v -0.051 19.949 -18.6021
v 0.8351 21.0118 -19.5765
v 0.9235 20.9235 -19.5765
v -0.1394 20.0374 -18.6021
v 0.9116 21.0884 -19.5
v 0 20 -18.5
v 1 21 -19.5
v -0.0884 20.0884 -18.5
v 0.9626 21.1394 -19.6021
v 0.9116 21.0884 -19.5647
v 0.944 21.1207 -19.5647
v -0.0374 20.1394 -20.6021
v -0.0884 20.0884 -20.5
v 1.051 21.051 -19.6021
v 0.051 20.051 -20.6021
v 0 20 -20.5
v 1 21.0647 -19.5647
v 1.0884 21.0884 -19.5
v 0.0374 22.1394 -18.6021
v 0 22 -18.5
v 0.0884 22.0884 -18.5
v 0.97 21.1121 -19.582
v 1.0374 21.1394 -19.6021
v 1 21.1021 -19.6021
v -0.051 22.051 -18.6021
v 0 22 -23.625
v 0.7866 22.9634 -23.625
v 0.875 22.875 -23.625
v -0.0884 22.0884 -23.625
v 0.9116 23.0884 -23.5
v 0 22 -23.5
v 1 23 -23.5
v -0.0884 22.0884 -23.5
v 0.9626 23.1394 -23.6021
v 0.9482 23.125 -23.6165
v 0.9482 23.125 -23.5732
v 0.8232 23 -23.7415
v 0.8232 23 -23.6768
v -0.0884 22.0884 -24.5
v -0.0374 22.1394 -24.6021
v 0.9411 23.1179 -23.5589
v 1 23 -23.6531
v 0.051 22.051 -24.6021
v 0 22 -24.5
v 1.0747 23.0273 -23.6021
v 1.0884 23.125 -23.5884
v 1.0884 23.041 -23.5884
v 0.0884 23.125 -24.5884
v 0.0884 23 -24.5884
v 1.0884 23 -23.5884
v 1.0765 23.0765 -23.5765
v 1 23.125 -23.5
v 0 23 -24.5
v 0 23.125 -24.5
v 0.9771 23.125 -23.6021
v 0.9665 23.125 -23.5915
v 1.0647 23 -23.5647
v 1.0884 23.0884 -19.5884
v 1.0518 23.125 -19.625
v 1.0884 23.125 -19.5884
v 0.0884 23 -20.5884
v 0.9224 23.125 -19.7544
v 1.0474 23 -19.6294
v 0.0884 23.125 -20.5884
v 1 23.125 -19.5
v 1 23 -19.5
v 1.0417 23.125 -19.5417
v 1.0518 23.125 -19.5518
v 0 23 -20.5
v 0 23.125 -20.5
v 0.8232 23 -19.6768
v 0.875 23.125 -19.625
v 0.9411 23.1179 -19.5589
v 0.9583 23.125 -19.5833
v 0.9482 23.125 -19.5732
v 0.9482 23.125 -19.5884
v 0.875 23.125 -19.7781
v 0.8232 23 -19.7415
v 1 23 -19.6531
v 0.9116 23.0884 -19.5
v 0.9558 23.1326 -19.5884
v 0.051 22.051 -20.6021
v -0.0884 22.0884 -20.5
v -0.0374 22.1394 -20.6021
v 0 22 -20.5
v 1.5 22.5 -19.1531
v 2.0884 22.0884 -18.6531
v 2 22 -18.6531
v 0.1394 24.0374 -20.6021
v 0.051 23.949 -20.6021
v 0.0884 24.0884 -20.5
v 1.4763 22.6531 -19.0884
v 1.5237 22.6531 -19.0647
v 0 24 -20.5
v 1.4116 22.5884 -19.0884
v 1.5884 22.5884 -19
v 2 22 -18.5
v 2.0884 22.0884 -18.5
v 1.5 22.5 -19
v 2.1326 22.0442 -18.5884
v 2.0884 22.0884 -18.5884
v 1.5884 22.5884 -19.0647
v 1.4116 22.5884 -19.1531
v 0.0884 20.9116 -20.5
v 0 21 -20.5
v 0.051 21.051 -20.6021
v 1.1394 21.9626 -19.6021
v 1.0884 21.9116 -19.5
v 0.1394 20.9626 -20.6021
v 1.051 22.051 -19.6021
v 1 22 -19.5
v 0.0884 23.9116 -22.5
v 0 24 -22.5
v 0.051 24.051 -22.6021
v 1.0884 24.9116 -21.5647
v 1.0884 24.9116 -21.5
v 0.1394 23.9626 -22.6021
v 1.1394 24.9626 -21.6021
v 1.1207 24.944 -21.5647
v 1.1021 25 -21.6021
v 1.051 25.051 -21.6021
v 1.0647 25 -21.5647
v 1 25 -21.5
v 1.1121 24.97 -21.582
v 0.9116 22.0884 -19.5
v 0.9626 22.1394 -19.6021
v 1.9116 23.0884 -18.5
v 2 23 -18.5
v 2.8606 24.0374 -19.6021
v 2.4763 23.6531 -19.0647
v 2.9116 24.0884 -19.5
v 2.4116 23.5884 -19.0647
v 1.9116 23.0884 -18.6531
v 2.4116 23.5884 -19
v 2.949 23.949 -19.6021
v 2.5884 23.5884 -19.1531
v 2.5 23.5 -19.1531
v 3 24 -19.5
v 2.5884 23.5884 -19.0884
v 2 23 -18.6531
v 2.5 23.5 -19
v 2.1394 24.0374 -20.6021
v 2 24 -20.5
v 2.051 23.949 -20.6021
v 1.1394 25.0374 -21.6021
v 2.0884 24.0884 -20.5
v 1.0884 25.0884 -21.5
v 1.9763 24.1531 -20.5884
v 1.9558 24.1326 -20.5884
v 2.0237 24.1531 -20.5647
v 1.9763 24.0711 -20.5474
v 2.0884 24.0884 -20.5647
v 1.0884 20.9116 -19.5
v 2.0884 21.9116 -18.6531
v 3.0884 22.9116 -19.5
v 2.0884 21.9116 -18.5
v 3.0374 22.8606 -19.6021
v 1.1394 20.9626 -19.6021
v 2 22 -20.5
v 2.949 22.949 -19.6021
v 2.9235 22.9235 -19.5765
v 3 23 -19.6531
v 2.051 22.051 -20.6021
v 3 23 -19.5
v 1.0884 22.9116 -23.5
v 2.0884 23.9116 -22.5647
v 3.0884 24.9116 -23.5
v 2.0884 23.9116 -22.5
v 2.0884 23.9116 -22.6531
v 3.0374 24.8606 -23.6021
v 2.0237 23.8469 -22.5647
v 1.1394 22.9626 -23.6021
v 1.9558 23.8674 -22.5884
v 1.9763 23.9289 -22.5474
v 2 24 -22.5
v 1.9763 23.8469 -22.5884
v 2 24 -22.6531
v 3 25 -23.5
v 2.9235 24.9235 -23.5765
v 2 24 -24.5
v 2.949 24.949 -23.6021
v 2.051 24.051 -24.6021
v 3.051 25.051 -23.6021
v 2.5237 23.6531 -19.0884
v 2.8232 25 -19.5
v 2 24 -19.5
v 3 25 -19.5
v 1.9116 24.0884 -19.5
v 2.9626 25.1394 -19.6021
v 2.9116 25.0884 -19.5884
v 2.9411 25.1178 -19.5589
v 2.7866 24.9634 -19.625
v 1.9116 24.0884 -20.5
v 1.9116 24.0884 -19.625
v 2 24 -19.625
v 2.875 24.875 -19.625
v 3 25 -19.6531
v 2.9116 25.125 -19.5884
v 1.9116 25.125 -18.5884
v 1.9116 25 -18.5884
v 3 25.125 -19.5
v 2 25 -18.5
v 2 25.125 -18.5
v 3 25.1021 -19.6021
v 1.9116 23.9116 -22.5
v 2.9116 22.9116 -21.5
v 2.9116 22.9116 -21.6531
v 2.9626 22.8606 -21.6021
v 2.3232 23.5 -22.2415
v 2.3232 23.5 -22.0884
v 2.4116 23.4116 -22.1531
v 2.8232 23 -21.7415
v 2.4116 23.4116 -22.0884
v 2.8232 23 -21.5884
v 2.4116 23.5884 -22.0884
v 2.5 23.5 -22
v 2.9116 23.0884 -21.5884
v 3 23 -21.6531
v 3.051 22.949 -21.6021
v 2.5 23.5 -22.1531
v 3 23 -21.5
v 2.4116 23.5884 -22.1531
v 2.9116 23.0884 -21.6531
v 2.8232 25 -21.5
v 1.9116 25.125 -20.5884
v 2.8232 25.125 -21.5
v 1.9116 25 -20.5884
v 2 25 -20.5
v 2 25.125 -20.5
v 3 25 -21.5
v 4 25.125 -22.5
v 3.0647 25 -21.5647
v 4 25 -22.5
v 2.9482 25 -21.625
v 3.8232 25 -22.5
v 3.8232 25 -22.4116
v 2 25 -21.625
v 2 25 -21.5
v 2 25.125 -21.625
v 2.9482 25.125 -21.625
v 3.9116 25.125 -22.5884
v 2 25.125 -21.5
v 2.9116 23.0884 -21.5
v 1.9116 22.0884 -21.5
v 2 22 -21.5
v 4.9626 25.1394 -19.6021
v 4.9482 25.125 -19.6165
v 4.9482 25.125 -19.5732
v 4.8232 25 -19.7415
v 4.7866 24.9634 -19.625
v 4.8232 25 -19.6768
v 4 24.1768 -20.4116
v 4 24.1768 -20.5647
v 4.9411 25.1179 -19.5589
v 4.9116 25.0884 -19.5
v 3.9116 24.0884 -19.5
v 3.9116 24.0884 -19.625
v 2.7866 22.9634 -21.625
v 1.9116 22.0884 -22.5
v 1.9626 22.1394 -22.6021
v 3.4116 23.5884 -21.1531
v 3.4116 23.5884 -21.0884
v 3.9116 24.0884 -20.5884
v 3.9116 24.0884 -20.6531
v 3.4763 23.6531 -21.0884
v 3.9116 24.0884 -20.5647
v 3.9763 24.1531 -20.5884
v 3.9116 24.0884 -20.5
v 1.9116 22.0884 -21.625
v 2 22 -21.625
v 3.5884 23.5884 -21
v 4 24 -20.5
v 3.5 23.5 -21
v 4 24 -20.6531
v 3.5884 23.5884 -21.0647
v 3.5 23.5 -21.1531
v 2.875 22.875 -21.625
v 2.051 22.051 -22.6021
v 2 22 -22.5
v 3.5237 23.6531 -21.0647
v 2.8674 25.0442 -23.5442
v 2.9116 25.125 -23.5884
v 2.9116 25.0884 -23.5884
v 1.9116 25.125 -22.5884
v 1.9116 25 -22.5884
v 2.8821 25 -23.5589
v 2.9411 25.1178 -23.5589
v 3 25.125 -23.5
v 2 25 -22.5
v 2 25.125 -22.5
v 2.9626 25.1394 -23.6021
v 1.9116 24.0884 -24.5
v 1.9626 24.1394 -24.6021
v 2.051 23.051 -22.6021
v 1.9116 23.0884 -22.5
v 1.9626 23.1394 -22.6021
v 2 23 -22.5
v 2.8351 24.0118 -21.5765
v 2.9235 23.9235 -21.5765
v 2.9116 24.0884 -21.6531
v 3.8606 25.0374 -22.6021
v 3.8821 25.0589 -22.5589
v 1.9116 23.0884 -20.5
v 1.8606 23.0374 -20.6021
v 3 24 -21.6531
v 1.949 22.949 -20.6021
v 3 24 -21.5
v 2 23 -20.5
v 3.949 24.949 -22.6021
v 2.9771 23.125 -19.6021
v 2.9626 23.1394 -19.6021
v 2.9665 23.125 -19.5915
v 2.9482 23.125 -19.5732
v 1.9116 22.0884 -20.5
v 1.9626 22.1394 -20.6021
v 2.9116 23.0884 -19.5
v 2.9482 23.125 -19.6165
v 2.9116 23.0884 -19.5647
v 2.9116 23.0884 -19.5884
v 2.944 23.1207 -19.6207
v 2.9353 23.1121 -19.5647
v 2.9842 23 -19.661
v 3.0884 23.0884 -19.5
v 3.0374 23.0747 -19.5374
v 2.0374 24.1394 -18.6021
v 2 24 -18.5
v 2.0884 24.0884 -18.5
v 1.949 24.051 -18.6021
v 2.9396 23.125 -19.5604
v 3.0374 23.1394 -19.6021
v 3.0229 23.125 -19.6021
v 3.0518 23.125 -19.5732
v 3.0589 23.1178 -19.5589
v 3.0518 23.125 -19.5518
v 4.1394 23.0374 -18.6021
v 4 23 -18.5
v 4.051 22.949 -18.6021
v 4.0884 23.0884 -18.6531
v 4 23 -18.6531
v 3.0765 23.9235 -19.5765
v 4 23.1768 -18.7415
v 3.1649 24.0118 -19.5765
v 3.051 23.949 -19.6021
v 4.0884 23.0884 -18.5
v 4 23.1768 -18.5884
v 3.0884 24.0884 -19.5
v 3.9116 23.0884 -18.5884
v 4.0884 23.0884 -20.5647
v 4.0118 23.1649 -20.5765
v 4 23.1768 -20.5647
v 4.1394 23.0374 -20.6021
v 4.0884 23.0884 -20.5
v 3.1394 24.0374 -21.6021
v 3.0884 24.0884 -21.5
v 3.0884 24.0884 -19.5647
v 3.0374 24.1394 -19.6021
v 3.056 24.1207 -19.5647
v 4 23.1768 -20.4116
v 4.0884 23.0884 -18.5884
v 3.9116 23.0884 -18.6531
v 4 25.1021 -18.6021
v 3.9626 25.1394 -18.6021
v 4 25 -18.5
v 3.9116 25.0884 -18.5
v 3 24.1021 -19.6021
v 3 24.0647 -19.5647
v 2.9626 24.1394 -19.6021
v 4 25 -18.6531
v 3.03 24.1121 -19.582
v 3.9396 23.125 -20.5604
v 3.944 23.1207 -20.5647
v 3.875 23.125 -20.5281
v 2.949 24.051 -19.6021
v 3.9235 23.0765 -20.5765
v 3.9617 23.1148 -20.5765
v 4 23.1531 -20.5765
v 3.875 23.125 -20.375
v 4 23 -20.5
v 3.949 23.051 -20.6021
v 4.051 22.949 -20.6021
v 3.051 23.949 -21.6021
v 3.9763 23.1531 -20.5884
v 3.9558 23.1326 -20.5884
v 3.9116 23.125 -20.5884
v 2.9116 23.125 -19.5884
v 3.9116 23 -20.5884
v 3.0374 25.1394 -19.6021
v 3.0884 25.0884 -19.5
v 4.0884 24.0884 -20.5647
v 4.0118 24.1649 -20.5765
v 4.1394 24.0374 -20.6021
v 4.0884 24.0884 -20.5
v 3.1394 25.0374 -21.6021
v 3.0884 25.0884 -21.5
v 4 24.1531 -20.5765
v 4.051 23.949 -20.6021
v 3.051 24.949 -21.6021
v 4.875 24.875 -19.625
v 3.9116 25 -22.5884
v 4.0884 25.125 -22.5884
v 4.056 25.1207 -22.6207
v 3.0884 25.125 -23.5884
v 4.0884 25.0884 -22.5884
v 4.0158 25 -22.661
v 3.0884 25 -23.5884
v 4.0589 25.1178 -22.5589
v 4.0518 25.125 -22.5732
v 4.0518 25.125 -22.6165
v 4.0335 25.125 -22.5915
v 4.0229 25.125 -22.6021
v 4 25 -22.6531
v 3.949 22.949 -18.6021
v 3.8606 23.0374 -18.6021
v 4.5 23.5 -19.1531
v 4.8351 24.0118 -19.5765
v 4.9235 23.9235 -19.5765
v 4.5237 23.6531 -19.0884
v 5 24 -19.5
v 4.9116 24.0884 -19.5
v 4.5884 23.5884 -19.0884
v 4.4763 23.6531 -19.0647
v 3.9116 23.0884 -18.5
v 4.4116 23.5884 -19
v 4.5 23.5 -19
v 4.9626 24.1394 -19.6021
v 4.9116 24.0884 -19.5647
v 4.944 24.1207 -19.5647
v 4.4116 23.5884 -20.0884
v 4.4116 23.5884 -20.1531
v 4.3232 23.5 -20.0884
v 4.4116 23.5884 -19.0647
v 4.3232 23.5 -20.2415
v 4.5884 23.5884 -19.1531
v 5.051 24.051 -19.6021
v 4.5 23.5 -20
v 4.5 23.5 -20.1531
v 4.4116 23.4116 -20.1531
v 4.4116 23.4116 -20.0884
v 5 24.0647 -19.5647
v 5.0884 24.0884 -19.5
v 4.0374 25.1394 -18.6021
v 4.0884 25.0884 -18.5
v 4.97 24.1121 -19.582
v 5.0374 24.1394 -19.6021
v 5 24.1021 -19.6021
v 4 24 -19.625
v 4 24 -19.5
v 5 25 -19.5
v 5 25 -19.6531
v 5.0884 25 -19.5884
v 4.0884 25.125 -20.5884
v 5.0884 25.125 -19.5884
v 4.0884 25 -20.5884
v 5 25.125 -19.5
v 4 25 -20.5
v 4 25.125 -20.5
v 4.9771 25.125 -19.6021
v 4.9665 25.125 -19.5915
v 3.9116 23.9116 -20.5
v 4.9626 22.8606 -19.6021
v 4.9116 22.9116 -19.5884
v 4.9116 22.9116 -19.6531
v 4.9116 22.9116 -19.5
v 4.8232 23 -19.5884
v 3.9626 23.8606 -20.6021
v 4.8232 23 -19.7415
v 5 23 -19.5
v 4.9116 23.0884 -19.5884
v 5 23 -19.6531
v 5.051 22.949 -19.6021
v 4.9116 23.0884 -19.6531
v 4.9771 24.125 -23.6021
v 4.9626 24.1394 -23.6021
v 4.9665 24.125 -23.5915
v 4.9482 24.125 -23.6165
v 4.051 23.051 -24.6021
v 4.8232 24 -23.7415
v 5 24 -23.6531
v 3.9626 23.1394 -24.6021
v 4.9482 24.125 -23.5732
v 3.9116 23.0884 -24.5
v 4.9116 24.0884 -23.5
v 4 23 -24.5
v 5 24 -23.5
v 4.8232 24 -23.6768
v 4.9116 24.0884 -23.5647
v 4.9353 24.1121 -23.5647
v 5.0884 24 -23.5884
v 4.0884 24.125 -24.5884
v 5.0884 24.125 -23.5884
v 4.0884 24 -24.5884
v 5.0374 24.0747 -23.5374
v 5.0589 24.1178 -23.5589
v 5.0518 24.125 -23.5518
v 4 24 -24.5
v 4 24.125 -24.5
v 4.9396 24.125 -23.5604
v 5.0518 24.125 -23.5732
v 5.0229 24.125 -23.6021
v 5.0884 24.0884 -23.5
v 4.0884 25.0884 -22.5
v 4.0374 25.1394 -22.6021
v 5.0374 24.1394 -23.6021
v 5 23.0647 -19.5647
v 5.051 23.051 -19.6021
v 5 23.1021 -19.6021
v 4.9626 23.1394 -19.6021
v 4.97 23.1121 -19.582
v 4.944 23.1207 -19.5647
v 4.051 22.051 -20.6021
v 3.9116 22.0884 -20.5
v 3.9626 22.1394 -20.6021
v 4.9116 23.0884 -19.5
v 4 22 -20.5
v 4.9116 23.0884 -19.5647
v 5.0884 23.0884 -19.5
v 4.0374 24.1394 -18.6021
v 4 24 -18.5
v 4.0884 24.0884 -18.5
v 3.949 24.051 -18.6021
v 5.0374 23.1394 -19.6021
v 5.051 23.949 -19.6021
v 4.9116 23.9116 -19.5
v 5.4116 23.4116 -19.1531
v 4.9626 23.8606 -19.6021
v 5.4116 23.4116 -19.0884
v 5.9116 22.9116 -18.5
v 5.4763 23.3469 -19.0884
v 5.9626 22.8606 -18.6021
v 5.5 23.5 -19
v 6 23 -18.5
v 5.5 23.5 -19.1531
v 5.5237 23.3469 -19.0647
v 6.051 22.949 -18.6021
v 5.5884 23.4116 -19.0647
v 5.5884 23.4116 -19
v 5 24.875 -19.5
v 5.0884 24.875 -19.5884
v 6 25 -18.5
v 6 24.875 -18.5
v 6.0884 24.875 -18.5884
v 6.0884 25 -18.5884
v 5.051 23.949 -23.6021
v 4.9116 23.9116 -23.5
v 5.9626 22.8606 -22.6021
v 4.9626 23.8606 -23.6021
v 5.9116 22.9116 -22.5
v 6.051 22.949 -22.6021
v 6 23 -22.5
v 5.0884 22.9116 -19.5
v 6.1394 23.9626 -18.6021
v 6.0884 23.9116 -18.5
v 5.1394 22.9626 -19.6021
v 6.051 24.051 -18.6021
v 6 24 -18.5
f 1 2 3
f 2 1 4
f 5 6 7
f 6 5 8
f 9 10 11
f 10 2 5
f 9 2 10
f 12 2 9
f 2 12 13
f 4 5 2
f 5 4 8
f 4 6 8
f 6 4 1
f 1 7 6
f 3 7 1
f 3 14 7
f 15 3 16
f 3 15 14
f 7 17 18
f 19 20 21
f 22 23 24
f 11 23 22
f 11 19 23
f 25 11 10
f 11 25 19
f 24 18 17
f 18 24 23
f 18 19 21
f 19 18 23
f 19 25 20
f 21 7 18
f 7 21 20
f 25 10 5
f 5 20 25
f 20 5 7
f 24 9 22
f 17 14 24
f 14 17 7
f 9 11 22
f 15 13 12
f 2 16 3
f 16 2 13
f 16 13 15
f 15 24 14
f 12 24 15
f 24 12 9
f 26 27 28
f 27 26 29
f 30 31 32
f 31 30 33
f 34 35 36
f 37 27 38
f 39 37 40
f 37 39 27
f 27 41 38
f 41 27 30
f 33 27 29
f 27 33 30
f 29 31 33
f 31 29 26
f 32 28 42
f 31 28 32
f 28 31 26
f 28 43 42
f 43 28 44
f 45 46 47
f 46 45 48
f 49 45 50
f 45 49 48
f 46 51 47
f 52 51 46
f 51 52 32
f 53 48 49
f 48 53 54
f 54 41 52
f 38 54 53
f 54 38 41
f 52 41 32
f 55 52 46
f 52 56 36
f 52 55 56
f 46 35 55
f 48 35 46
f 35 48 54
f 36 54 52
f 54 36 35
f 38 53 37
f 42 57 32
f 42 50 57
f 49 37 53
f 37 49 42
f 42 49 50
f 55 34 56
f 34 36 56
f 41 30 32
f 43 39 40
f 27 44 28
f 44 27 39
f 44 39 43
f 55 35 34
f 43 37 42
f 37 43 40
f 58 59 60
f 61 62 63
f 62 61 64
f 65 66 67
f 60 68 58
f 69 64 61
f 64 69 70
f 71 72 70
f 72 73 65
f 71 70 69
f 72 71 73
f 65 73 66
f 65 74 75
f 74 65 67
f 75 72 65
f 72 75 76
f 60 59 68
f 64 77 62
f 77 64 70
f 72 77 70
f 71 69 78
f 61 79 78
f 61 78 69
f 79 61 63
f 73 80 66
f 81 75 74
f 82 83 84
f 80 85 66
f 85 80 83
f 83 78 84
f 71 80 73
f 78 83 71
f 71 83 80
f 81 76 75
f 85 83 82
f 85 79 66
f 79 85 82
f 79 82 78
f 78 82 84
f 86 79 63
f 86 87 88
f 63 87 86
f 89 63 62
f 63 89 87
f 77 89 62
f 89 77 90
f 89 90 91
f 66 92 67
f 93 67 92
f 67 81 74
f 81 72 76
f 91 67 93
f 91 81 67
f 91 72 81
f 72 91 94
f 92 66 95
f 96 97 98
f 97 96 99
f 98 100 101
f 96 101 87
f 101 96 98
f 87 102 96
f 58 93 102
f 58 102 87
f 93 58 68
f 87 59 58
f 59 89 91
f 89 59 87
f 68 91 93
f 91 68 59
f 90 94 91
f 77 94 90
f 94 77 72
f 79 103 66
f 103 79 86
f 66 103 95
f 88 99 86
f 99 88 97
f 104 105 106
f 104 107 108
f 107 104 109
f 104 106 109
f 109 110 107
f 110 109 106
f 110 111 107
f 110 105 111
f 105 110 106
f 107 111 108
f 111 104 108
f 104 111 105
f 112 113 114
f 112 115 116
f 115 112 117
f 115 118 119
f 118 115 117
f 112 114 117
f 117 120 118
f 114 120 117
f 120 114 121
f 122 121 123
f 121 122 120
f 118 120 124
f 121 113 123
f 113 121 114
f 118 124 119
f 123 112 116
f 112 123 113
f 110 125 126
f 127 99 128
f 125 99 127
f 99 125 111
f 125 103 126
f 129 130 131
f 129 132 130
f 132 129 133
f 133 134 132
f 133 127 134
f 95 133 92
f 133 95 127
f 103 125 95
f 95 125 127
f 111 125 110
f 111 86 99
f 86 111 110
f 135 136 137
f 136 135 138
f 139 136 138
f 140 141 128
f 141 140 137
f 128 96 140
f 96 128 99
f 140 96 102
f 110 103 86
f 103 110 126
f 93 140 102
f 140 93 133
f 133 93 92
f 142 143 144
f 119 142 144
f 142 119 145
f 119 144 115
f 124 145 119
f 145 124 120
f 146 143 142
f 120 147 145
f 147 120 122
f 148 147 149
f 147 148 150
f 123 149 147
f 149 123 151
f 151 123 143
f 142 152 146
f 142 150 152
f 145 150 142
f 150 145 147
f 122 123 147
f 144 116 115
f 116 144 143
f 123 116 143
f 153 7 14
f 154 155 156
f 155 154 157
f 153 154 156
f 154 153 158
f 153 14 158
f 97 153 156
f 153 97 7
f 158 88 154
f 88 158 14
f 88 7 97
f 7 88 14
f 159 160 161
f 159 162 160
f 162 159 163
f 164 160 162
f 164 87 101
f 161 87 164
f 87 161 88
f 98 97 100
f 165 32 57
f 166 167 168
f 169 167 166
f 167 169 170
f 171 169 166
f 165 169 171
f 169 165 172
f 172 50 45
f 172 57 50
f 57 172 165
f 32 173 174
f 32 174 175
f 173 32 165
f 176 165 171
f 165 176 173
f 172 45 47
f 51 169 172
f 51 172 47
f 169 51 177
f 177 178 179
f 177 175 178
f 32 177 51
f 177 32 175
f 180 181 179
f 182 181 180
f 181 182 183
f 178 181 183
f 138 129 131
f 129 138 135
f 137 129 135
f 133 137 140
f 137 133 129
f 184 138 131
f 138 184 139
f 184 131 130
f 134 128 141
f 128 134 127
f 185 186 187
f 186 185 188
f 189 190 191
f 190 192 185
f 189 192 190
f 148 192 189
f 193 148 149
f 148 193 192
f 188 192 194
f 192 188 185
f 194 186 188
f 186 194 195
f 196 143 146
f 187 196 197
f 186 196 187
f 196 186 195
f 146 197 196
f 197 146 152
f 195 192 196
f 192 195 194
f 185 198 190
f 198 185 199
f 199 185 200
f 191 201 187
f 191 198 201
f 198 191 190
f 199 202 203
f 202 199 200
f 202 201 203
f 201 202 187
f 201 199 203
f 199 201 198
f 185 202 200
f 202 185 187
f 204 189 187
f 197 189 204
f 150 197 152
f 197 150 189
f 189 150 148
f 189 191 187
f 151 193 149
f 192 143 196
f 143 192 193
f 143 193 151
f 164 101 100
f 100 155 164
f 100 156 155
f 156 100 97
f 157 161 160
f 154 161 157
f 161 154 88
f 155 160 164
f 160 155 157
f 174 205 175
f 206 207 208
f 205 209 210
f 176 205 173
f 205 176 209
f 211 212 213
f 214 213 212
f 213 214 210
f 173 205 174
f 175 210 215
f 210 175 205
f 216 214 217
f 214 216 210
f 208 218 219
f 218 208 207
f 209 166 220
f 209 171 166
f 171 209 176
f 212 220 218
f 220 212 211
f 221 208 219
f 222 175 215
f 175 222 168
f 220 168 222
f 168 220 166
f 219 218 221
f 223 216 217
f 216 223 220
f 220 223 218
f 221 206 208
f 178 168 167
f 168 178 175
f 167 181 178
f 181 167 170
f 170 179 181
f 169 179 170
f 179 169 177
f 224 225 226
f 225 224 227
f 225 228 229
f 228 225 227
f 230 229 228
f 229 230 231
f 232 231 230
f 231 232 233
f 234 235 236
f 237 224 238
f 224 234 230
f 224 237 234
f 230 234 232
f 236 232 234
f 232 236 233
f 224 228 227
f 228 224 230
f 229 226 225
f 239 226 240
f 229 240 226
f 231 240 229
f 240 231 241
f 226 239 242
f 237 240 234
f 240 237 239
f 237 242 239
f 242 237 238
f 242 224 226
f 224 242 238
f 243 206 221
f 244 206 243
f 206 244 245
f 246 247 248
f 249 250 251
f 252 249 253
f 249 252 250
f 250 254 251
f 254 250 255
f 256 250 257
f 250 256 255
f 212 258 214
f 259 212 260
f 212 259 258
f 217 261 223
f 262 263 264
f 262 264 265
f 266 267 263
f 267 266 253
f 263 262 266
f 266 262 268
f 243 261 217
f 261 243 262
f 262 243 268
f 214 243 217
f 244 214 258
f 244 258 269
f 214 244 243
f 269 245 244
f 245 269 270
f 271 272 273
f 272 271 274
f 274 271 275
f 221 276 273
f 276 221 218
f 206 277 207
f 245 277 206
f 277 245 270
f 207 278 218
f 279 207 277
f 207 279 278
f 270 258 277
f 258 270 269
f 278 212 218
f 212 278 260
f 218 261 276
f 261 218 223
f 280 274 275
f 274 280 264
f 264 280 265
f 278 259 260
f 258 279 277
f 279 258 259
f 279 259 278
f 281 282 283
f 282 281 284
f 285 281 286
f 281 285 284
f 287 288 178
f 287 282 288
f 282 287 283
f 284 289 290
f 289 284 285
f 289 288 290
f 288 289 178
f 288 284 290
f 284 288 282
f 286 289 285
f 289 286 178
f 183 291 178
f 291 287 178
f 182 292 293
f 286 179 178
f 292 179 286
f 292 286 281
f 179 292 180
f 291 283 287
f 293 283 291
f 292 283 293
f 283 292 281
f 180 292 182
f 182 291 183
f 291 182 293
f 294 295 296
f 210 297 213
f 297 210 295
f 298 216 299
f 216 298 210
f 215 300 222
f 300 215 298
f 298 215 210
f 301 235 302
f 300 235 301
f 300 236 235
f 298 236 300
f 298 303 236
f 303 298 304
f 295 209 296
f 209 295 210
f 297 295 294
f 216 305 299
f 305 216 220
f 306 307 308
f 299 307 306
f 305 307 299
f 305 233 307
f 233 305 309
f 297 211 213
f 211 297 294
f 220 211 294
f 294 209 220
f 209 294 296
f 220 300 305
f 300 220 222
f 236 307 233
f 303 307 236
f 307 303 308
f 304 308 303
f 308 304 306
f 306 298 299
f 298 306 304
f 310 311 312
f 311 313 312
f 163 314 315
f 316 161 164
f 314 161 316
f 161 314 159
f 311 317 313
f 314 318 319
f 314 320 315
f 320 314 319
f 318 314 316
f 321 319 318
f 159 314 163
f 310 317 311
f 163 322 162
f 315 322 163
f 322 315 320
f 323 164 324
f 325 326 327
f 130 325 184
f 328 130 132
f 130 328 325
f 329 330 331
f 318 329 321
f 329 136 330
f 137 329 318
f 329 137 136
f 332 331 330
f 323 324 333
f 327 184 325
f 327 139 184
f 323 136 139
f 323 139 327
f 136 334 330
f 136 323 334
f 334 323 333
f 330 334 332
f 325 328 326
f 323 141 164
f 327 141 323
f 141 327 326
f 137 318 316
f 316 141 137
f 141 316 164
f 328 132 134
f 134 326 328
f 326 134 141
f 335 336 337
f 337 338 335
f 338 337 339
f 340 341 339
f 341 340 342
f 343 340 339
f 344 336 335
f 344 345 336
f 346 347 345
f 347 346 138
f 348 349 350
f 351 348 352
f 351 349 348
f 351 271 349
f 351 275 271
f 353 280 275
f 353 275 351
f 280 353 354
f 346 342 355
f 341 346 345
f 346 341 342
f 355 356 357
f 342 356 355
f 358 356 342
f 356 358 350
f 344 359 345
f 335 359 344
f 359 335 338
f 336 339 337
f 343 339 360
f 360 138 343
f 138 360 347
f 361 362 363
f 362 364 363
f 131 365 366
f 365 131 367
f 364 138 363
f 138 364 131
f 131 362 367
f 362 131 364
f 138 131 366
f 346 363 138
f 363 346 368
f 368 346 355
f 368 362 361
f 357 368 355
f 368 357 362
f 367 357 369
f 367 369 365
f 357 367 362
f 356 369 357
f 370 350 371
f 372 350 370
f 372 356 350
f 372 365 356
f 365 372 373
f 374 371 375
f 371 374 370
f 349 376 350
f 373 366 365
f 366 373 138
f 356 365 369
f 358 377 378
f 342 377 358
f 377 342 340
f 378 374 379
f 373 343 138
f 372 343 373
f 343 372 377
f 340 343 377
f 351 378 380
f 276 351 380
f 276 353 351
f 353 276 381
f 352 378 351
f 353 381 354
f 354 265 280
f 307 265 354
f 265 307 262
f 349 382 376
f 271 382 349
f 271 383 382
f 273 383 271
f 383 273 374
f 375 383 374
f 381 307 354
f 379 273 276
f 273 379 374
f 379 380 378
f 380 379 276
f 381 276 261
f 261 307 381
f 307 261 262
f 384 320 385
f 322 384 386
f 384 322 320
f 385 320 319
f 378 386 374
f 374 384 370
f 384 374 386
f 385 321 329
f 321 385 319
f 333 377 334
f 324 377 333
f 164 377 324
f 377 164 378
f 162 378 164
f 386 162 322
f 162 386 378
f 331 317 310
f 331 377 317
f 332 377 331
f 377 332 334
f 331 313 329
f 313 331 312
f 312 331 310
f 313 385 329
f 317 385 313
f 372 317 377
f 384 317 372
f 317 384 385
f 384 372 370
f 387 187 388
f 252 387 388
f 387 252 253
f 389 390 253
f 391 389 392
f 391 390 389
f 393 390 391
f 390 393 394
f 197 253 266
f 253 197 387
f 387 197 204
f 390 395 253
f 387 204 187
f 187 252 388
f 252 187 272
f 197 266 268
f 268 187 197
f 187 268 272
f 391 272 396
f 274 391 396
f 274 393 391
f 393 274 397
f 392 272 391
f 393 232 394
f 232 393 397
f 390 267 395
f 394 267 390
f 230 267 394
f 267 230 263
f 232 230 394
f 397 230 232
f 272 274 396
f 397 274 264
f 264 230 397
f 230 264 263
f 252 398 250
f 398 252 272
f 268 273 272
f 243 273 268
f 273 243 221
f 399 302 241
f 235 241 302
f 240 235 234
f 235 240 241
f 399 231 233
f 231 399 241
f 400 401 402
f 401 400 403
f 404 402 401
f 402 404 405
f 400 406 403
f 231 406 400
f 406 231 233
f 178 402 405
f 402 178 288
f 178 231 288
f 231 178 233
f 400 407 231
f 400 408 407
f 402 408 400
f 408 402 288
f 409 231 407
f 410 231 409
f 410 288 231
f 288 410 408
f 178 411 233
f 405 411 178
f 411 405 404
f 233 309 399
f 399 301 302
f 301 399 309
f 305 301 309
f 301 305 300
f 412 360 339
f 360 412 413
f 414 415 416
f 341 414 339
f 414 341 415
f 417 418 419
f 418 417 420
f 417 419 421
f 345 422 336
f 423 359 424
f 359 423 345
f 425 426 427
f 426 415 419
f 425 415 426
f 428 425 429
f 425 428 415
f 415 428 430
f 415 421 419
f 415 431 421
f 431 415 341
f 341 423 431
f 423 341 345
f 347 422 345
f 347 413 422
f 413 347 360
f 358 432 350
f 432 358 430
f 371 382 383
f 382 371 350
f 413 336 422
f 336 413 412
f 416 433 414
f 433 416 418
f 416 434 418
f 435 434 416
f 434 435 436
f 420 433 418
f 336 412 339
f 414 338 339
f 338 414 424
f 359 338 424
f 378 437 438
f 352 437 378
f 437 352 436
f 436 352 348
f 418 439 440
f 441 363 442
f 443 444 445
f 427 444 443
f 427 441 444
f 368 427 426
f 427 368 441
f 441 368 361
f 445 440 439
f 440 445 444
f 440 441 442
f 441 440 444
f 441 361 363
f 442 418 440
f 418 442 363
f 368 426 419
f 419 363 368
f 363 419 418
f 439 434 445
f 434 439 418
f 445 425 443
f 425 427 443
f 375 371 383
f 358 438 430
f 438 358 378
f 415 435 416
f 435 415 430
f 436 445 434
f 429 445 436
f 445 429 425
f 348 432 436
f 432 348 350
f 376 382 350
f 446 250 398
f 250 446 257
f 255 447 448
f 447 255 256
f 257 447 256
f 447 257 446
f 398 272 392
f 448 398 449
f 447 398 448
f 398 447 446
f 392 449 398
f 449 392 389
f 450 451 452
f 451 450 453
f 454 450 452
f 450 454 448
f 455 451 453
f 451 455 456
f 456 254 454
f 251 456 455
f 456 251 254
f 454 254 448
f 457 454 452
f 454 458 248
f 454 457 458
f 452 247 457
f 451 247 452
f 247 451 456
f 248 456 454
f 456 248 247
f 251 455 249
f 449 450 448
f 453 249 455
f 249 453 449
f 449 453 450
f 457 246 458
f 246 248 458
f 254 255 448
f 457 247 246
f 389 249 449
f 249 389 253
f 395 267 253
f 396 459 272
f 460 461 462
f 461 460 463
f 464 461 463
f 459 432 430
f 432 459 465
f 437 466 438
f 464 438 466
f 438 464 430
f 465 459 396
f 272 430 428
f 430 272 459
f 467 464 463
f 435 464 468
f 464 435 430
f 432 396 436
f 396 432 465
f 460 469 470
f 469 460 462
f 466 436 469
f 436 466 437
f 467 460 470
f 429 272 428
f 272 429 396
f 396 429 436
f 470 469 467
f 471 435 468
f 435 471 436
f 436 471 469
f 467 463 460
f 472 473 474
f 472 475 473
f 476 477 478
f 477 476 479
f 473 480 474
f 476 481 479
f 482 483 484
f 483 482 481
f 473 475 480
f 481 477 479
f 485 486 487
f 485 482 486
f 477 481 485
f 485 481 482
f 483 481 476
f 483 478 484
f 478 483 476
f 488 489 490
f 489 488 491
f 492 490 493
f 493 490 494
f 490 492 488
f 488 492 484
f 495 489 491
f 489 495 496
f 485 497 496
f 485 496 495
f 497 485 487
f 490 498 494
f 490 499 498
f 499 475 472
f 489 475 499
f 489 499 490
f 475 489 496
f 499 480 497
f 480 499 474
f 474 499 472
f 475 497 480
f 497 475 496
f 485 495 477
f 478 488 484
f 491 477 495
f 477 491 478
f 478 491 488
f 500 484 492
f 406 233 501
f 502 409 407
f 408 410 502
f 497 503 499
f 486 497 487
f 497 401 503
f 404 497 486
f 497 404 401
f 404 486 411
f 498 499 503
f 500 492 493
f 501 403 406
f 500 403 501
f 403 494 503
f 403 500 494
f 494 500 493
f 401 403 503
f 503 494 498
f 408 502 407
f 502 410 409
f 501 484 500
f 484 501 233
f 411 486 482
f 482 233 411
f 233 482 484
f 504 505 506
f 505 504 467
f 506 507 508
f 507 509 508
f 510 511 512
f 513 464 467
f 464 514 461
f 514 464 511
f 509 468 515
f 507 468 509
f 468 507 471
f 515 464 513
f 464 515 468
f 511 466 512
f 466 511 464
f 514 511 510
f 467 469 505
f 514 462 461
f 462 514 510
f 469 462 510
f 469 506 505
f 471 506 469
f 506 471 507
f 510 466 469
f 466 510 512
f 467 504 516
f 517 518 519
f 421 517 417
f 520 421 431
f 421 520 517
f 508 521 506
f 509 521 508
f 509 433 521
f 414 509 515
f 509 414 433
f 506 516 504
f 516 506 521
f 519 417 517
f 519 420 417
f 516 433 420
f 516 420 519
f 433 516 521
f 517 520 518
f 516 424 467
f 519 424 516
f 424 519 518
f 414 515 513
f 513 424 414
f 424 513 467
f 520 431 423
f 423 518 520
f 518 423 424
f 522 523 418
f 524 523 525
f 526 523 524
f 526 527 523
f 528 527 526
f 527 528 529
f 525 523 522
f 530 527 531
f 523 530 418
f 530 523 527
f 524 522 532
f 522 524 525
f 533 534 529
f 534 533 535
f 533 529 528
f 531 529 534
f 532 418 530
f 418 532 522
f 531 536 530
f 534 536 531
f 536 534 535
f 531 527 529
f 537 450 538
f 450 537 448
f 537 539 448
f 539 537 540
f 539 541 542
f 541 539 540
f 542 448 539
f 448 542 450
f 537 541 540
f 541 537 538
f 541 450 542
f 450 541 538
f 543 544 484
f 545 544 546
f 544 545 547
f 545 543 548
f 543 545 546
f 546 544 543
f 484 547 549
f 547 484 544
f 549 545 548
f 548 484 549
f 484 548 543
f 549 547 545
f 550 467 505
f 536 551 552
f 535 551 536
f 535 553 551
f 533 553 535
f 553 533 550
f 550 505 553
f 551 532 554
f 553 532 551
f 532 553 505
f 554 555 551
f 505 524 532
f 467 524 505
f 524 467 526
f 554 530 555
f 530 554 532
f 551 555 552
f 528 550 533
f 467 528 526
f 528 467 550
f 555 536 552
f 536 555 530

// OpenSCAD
translate(v = [-0.5, -0.5, 0]) {
	/*Shell 0*/
	union() {
		%/*Nodes shell 0*/
		union() {
			/*Node $_12*/
			color(alpha = 0.1, c = "orange") {
				translate(v = [0, 20, -19]) {
					cube(size = [1, 1, 1]);
				}
			}
			/*Node $_25*/
			color(alpha = 0.1, c = "yellow") {
				translate(v = [0, 22, -19]) {
					cube(size = [1, 1, 1]);
				}
			}
			/*Node $_6*/
			color(alpha = 0.1, c = "pink") {
				translate(v = [0, 20, -21]) {
					cube(size = [1, 1, 1]);
				}
			}
			/*Node $_14*/
			color(alpha = 0.1, c = "orange") {
				translate(v = [0, 22, -24]) {
					cube(size = [1, 1, 1]);
				}
			}
			/*Node $_27*/
			color(alpha = 0.1, c = "yellow") {
				translate(v = [0, 23, -25]) {
					cube(size = [1, 1, 1]);
				}
			}
			/*Node $_8*/
			color(alpha = 0.1, c = "pink") {
				translate(v = [0, 22, -25]) {
					cube(size = [1, 1, 1]);
				}
			}
			/*Node $_21*/
			color(alpha = 0.1, c = "orange") {
				translate(v = [0, 23, -21]) {
					cube(size = [1, 1, 1]);
				}
			}
			/*Node $_34*/
			color(alpha = 0.1, c = "yellow") {
				translate(v = [0, 22, -21]) {
					cube(size = [1, 1, 1]);
				}
			}
			/*Node $_10*/
			color(alpha = 0.1, c = "pink") {
				translate(v = [0, 24, -21]) {
					cube(size = [1, 1, 1]);
				}
			}
			/*Node $_3__0*/
			color(alpha = 0.1, c = "lightblue") {
				translate(v = [0, 21, -21]) {
					cube(size = [1, 1, 1]);
				}
			}
			/*Node $_5__0*/
			color(alpha = 0.1, c = "lightblue") {
				translate(v = [0, 24, -23]) {
					cube(size = [1, 1, 1]);
				}
			}
		}
		/*Edges shell 0*/
		union() {
			/*Edge 12 from bank.devices[0].thingy.vcollect to $_12*/
			translate(v = [0.5, 20.5, -18.5]) {
				rotate(a = [0, 125.26438968275465, 45.0]) {
					cube(size = [0.125, 0.125, 1.7320508075688772]);
				}
			}
			/*Edge 25 from bank.devices[0].thingy.vcollect to $_25*/
			translate(v = [0.5, 22.5, -18.5]) {
				rotate(a = [0, 125.26438968275465, -45.0]) {
					cube(size = [0.125, 0.125, 1.7320508075688772]);
				}
			}
			/*Edge 6 from bank.devices[0].thingy.vcollect to $_6*/
			translate(v = [0.5, 20.5, -20.5]) {
				rotate(a = [0, 54.735610317245346, 45.0]) {
					cube(size = [0.125, 0.125, 1.7320508075688772]);
				}
			}
			/*Edge 14 from bank.devices[0].thingy.vlysis_out to $_14*/
			translate(v = [0.5, 22.5, -23.5]) {
				rotate(a = [0, 90.0, 45.0]) {
					cube(size = [0.125, 0.125, 1.4142135623730951]);
				}
			}
			/*Edge 27 from bank.devices[0].thingy.vlysis_out to $_27*/
			translate(v = [0.5, 23.5, -24.5]) {
				rotate(a = [0, 45.00000000000001, 0.0]) {
					cube(size = [0.125, 0.125, 1.4142135623730951]);
				}
			}
			/*Edge 8 from bank.devices[0].thingy.vlysis_out to $_8*/
			translate(v = [0.5, 22.5, -24.5]) {
				rotate(a = [0, 54.735610317245346, 45.0]) {
					cube(size = [0.125, 0.125, 1.7320508075688772]);
				}
			}
			/*Edge 21 from bank.devices[0].thingy.vwaste to $_21*/
			translate(v = [0.5, 23.5, -20.5]) {
				rotate(a = [0, 45.00000000000001, 0.0]) {
					cube(size = [0.125, 0.125, 1.4142135623730951]);
				}
			}
			/*Edge 34 from bank.devices[0].thingy.vwaste to $_34*/
			translate(v = [0.5, 22.5, -20.5]) {
				rotate(a = [0, 54.735610317245346, 45.0]) {
					cube(size = [0.125, 0.125, 1.7320508075688772]);
				}
			}
			/*Edge 10 from bank.devices[0].thingy.vwaste to $_10*/
			translate(v = [0.5, 24.5, -20.5]) {
				rotate(a = [0, 54.735610317245346, -45.0]) {
					cube(size = [0.125, 0.125, 1.7320508075688772]);
				}
			}
			/*Edge -1 from $_3__0 to $_3__1*/
			translate(v = [1.5, 22.5, -19.5]) {
				rotate(a = [0, 125.26438968275465, -135.0]) {
					cube(size = [0.125, 0.125, 1.7320508075688772]);
				}
			}
			/*Edge -1 from $_5__0 to $_5__1*/
			translate(v = [1.5, 25.5, -21.5]) {
				rotate(a = [0, 125.26438968275465, -135.0]) {
					cube(size = [0.125, 0.125, 1.7320508075688772]);
				}
			}
		}
	}
	/*Shell 1*/
	union() {
		%/*Nodes shell 1*/
		union() {
			/*Node bank.devices[0].thingy.vcollect*/
			color(alpha = 0.1, c = "black") {
				translate(v = [1, 21, -20]) {
					cube(size = [1, 1, 1]);
				}
			}
			/*Node bank.devices[0].thingy.vlysis_out*/
			color(alpha = 0.1, c = "black") {
				translate(v = [1, 23, -24]) {
					cube(size = [1, 1, 1]);
				}
			}
			/*Node bank.devices[0].thingy.vwaste*/
			color(alpha = 0.1, c = "black") {
				translate(v = [1, 23, -20]) {
					cube(size = [1, 1, 1]);
				}
			}
			/*Node $_3__1*/
			color(alpha = 0.1, c = "lightblue") {
				translate(v = [1, 22, -20]) {
					cube(size = [1, 1, 1]);
				}
			}
			/*Node $_5__1*/
			color(alpha = 0.1, c = "lightblue") {
				translate(v = [1, 25, -22]) {
					cube(size = [1, 1, 1]);
				}
			}
		}
		/*Edges shell 1*/
		union() {
			/*Edge -1 from $_3 to $_3__1*/
			translate(v = [1.5, 22.5, -19.5]) {
				rotate(a = [0, 54.735610317245346, 45.0]) {
					cube(size = [0.125, 0.125, 1.7320508075688772]);
				}
			}
			/*Edge -1 from $_5 to $_5__1*/
			translate(v = [1.5, 25.5, -21.5]) {
				rotate(a = [0, 54.735610317245346, -45.0]) {
					cube(size = [0.125, 0.125, 1.7320508075688772]);
				}
			}
			/*Edge 40 from bank.devices[0].thingy.vcollect to $_40*/
			translate(v = [2.5, 22.5, -18.5]) {
				rotate(a = [0, 125.26438968275465, -135.0]) {
					cube(size = [0.125, 0.125, 1.7320508075688772]);
				}
			}
			/*Edge 40 from $_40 to bank.devices[0].thingy.vwaste*/
			translate(v = [1.5, 23.5, -19.5]) {
				rotate(a = [0, 54.735610317245346, -45.0]) {
					cube(size = [0.125, 0.125, 1.7320508075688772]);
				}
			}
			/*Edge 42 from bank.devices[0].thingy.vlysis_out to $_42*/
			translate(v = [2.5, 24.5, -22.5]) {
				rotate(a = [0, 125.26438968275465, -135.0]) {
					cube(size = [0.125, 0.125, 1.7320508075688772]);
				}
			}
		}
	}
	/*Shell 2*/
	union() {
		%/*Nodes shell 2*/
		union() {
			/*Node $_3*/
			color(alpha = 0.1, c = "pink") {
				translate(v = [2, 23, -19]) {
					cube(size = [1, 1, 1]);
				}
			}
			/*Node $_24*/
			color(alpha = 0.1, c = "yellow") {
				translate(v = [2, 24, -20]) {
					cube(size = [1, 1, 1]);
				}
			}
			/*Node $_39*/
			color(alpha = 0.1, c = "yellow") {
				translate(v = [2, 25, -19]) {
					cube(size = [1, 1, 1]);
				}
			}
			/*Node $_5*/
			color(alpha = 0.1, c = "pink") {
				translate(v = [2, 24, -21]) {
					cube(size = [1, 1, 1]);
				}
			}
			/*Node $_40*/
			color(alpha = 0.1, c = "lightgreen") {
				translate(v = [2, 22, -19]) {
					cube(size = [1, 1, 1]);
				}
			}
			/*Node $_42*/
			color(alpha = 0.1, c = "lightgreen") {
				translate(v = [2, 24, -23]) {
					cube(size = [1, 1, 1]);
				}
			}
			/*Node $_16*/
			color(alpha = 0.1, c = "orange") {
				translate(v = [2, 25, -21]) {
					cube(size = [1, 1, 1]);
				}
			}
			/*Node $_29*/
			color(alpha = 0.1, c = "yellow") {
				translate(v = [2, 25, -22]) {
					cube(size = [1, 1, 1]);
				}
			}
			/*Node $_17*/
			color(alpha = 0.1, c = "orange") {
				translate(v = [2, 22, -22]) {
					cube(size = [1, 1, 1]);
				}
			}
			/*Node $_30*/
			color(alpha = 0.1, c = "yellow") {
				translate(v = [2, 22, -23]) {
					cube(size = [1, 1, 1]);
				}
			}
			/*Node $_18*/
			color(alpha = 0.1, c = "orange") {
				translate(v = [2, 25, -23]) {
					cube(size = [1, 1, 1]);
				}
			}
			/*Node $_31*/
			color(alpha = 0.1, c = "yellow") {
				translate(v = [2, 24, -25]) {
					cube(size = [1, 1, 1]);
				}
			}
			/*Node $_19*/
			color(alpha = 0.1, c = "orange") {
				translate(v = [2, 23, -23]) {
					cube(size = [1, 1, 1]);
				}
			}
			/*Node $_32*/
			color(alpha = 0.1, c = "yellow") {
				translate(v = [2, 23, -21]) {
					cube(size = [1, 1, 1]);
				}
			}
			/*Node $_20*/
			color(alpha = 0.1, c = "orange") {
				translate(v = [2, 22, -21]) {
					cube(size = [1, 1, 1]);
				}
			}
			/*Node $_33*/
			color(alpha = 0.1, c = "yellow") {
				translate(v = [2, 24, -19]) {
					cube(size = [1, 1, 1]);
				}
			}
		}
		/*Edges shell 2*/
		union() {
			/*Edge 3 from bank.devices[0].thingy.vbead_out to $_3*/
			translate(v = [2.5, 23.5, -18.5]) {
				rotate(a = [0, 125.26438968275465, 45.0]) {
					cube(size = [0.125, 0.125, 1.7320508075688772]);
				}
			}
			/*Edge 24 from bank.devices[0].thingy.vcell_out to $_24*/
			translate(v = [2.5, 24.5, -19.5]) {
				rotate(a = [0, 90.0, 45.0]) {
					cube(size = [0.125, 0.125, 1.4142135623730951]);
				}
			}
			/*Edge 39 from bank.devices[0].thingy.vcell_out to $_39*/
			translate(v = [2.5, 25.5, -18.5]) {
				rotate(a = [0, 135.0, 0.0]) {
					cube(size = [0.125, 0.125, 1.4142135623730951]);
				}
			}
			/*Edge 5 from bank.devices[0].thingy.vcell_out to $_5*/
			translate(v = [2.5, 24.5, -20.5]) {
				rotate(a = [0, 54.735610317245346, 45.0]) {
					cube(size = [0.125, 0.125, 1.7320508075688772]);
				}
			}
			/*Edge 40 from $_40 to bank.devices[0].thingy.vsieve*/
			translate(v = [3.5, 23.5, -19.5]) {
				rotate(a = [0, 54.735610317245346, -135.0]) {
					cube(size = [0.125, 0.125, 1.7320508075688772]);
				}
			}
			/*Edge 42 from $_42 to bank.devices[0].thingy.vpump2*/
			translate(v = [3.5, 23.5, -21.5]) {
				rotate(a = [0, 125.26438968275465, 135.0]) {
					cube(size = [0.125, 0.125, 1.7320508075688772]);
				}
			}
			/*Edge 42 from $_42 to bank.devices[0].thingy.vpump3*/
			translate(v = [3.5, 25.5, -23.5]) {
				rotate(a = [0, 54.735610317245346, -135.0]) {
					cube(size = [0.125, 0.125, 1.7320508075688772]);
				}
			}
			/*Edge 16 from bank.devices[0].thingy.vpump1 to $_16*/
			translate(v = [2.5, 25.5, -20.5]) {
				rotate(a = [0, 135.0, 0.0]) {
					cube(size = [0.125, 0.125, 1.4142135623730951]);
				}
			}
			/*Edge 29 from bank.devices[0].thingy.vpump1 to $_29*/
			translate(v = [2.5, 25.5, -21.5]) {
				rotate(a = [0, 90.0, 0.0]) {
					cube(size = [0.125, 0.125, 1.0]);
				}
			}
			/*Edge 17 from bank.devices[0].thingy.vpump2 to $_17*/
			translate(v = [2.5, 22.5, -21.5]) {
				rotate(a = [0, 90.0, 45.0]) {
					cube(size = [0.125, 0.125, 1.4142135623730951]);
				}
			}
			/*Edge 30 from bank.devices[0].thingy.vpump2 to $_30*/
			translate(v = [2.5, 22.5, -22.5]) {
				rotate(a = [0, 54.735610317245346, 45.0]) {
					cube(size = [0.125, 0.125, 1.7320508075688772]);
				}
			}
			/*Edge 18 from bank.devices[0].thingy.vpump3 to $_18*/
			translate(v = [2.5, 25.5, -22.5]) {
				rotate(a = [0, 135.0, 0.0]) {
					cube(size = [0.125, 0.125, 1.4142135623730951]);
				}
			}
			/*Edge 31 from bank.devices[0].thingy.vpump3 to $_31*/
			translate(v = [2.5, 24.5, -24.5]) {
				rotate(a = [0, 54.735610317245346, 45.0]) {
					cube(size = [0.125, 0.125, 1.7320508075688772]);
				}
			}
			/*Edge 19 from bank.devices[0].thingy.vsep to $_19*/
			translate(v = [2.5, 23.5, -22.5]) {
				rotate(a = [0, 54.735610317245346, 45.0]) {
					cube(size = [0.125, 0.125, 1.7320508075688772]);
				}
			}
			/*Edge 32 from bank.devices[0].thingy.vsep to $_32*/
			translate(v = [2.5, 23.5, -20.5]) {
				rotate(a = [0, 125.26438968275465, 45.0]) {
					cube(size = [0.125, 0.125, 1.7320508075688772]);
				}
			}
			/*Edge 20 from bank.devices[0].thingy.vsieve to $_20*/
			translate(v = [2.5, 22.5, -20.5]) {
				rotate(a = [0, 54.735610317245346, 45.0]) {
					cube(size = [0.125, 0.125, 1.7320508075688772]);
				}
			}
			/*Edge 33 from bank.devices[0].thingy.vsieve to $_33*/
			translate(v = [2.5, 24.5, -18.5]) {
				rotate(a = [0, 125.26438968275465, -45.0]) {
					cube(size = [0.125, 0.125, 1.7320508075688772]);
				}
			}
		}
	}
	/*Shell 3*/
	union() {
		%/*Nodes shell 3*/
		union() {
			/*Node bank.devices[0].thingy.vbead_out*/
			color(alpha = 0.1, c = "black") {
				translate(v = [3, 24, -20]) {
					cube(size = [1, 1, 1]);
				}
			}
			/*Node bank.devices[0].thingy.vcell_out*/
			color(alpha = 0.1, c = "black") {
				translate(v = [3, 25, -20]) {
					cube(size = [1, 1, 1]);
				}
			}
			/*Node bank.devices[0].thingy.vpump1*/
			color(alpha = 0.1, c = "black") {
				translate(v = [3, 25, -22]) {
					cube(size = [1, 1, 1]);
				}
			}
			/*Node bank.devices[0].thingy.vpump2*/
			color(alpha = 0.1, c = "black") {
				translate(v = [3, 23, -22]) {
					cube(size = [1, 1, 1]);
				}
			}
			/*Node bank.devices[0].thingy.vpump3*/
			color(alpha = 0.1, c = "black") {
				translate(v = [3, 25, -24]) {
					cube(size = [1, 1, 1]);
				}
			}
			/*Node bank.devices[0].thingy.vsep*/
			color(alpha = 0.1, c = "black") {
				translate(v = [3, 24, -22]) {
					cube(size = [1, 1, 1]);
				}
			}
			/*Node bank.devices[0].thingy.vsieve*/
			color(alpha = 0.1, c = "black") {
				translate(v = [3, 23, -20]) {
					cube(size = [1, 1, 1]);
				}
			}
		}
		/*Edges shell 3*/
		union() {
			/*Edge 22 from $_22 to bank.devices[0].thingy.vbead_out*/
			translate(v = [3.5, 24.5, -19.5]) {
				rotate(a = [0, 54.735610317245346, -45.0]) {
					cube(size = [0.125, 0.125, 1.7320508075688772]);
				}
			}
			/*Edge 35 from $_35 to bank.devices[0].thingy.vbead_out*/
			translate(v = [3.5, 24.5, -19.5]) {
				rotate(a = [0, 54.735610317245346, 45.0]) {
					cube(size = [0.125, 0.125, 1.7320508075688772]);
				}
			}
			/*Edge 37 from $_37 to bank.devices[0].thingy.vbead_out*/
			translate(v = [3.5, 24.5, -19.5]) {
				rotate(a = [0, 125.26438968275465, -45.0]) {
					cube(size = [0.125, 0.125, 1.7320508075688772]);
				}
			}
			/*Edge 37 from $_37 to bank.devices[0].thingy.vsep*/
			translate(v = [3.5, 24.5, -21.5]) {
				rotate(a = [0, 54.735610317245346, -45.0]) {
					cube(size = [0.125, 0.125, 1.7320508075688772]);
				}
			}
			/*Edge 37 from $_37 to bank.devices[0].thingy.vsieve*/
			translate(v = [3.5, 23.5, -19.5]) {
				rotate(a = [0, 135.0, 0.0]) {
					cube(size = [0.125, 0.125, 1.4142135623730951]);
				}
			}
			/*Edge 38 from $_38 to bank.devices[0].thingy.vcell_out*/
			translate(v = [3.5, 25.5, -19.5]) {
				rotate(a = [0, 125.26438968275465, -45.0]) {
					cube(size = [0.125, 0.125, 1.7320508075688772]);
				}
			}
			/*Edge 38 from $_38 to bank.devices[0].thingy.vpump1*/
			translate(v = [3.5, 25.5, -21.5]) {
				rotate(a = [0, 54.735610317245346, -45.0]) {
					cube(size = [0.125, 0.125, 1.7320508075688772]);
				}
			}
			/*Edge 38 from $_38 to bank.devices[0].thingy.vpump2*/
			translate(v = [3.5, 23.5, -21.5]) {
				rotate(a = [0, 54.735610317245346, 45.0]) {
					cube(size = [0.125, 0.125, 1.7320508075688772]);
				}
			}
			/*Edge 41 from $_41 to bank.devices[0].thingy.vpump1*/
			translate(v = [3.5, 25.5, -21.5]) {
				rotate(a = [0, 135.0, 0.0]) {
					cube(size = [0.125, 0.125, 1.4142135623730951]);
				}
			}
			/*Edge 41 from $_41 to bank.devices[0].thingy.vpump3*/
			translate(v = [3.5, 25.5, -23.5]) {
				rotate(a = [0, 45.00000000000001, 0.0]) {
					cube(size = [0.125, 0.125, 1.4142135623730951]);
				}
			}
			/*Edge 41 from $_41 to bank.devices[0].thingy.vsep*/
			translate(v = [3.5, 24.5, -21.5]) {
				rotate(a = [0, 125.26438968275465, 45.0]) {
					cube(size = [0.125, 0.125, 1.7320508075688772]);
				}
			}
		}
	}
	/*Shell 4*/
	union() {
		%/*Nodes shell 4*/
		union() {
			/*Node $_22*/
			color(alpha = 0.1, c = "orange") {
				translate(v = [4, 23, -19]) {
					cube(size = [1, 1, 1]);
				}
			}
			/*Node $_35*/
			color(alpha = 0.1, c = "yellow") {
				translate(v = [4, 25, -19]) {
					cube(size = [1, 1, 1]);
				}
			}
			/*Node $_37*/
			color(alpha = 0.1, c = "lightgreen") {
				translate(v = [4, 23, -21]) {
					cube(size = [1, 1, 1]);
				}
			}
			/*Node $_23*/
			color(alpha = 0.1, c = "orange") {
				translate(v = [4, 24, -20]) {
					cube(size = [1, 1, 1]);
				}
			}
			/*Node $_36*/
			color(alpha = 0.1, c = "yellow") {
				translate(v = [4, 25, -21]) {
					cube(size = [1, 1, 1]);
				}
			}
			/*Node $_38*/
			color(alpha = 0.1, c = "lightgreen") {
				translate(v = [4, 24, -21]) {
					cube(size = [1, 1, 1]);
				}
			}
			/*Node $_13*/
			color(alpha = 0.1, c = "orange") {
				translate(v = [4, 23, -25]) {
					cube(size = [1, 1, 1]);
				}
			}
			/*Node $_26*/
			color(alpha = 0.1, c = "yellow") {
				translate(v = [4, 24, -25]) {
					cube(size = [1, 1, 1]);
				}
			}
			/*Node $_41*/
			color(alpha = 0.1, c = "lightgreen") {
				translate(v = [4, 25, -23]) {
					cube(size = [1, 1, 1]);
				}
			}
			/*Node $_15*/
			color(alpha = 0.1, c = "orange") {
				translate(v = [4, 22, -21]) {
					cube(size = [1, 1, 1]);
				}
			}
			/*Node $_28*/
			color(alpha = 0.1, c = "yellow") {
				translate(v = [4, 24, -19]) {
					cube(size = [1, 1, 1]);
				}
			}
		}
		/*Edges shell 4*/
		union() {
			/*Edge 22 from bank.devices[0].thingy.vbead_in to $_22*/
			translate(v = [4.5, 23.5, -18.5]) {
				rotate(a = [0, 125.26438968275465, 45.0]) {
					cube(size = [0.125, 0.125, 1.7320508075688772]);
				}
			}
			/*Edge 35 from bank.devices[0].thingy.vbead_in to $_35*/
			translate(v = [4.5, 25.5, -18.5]) {
				rotate(a = [0, 125.26438968275465, -45.0]) {
					cube(size = [0.125, 0.125, 1.7320508075688772]);
				}
			}
			/*Edge 37 from bank.devices[0].thingy.vbead_in to $_37*/
			translate(v = [4.5, 23.5, -20.5]) {
				rotate(a = [0, 54.735610317245346, 45.0]) {
					cube(size = [0.125, 0.125, 1.7320508075688772]);
				}
			}
			/*Edge 23 from bank.devices[0].thingy.vcell_in to $_23*/
			translate(v = [4.5, 24.5, -19.5]) {
				rotate(a = [0, 90.0, 45.0]) {
					cube(size = [0.125, 0.125, 1.4142135623730951]);
				}
			}
			/*Edge 36 from bank.devices[0].thingy.vcell_in to $_36*/
			translate(v = [4.5, 25.5, -20.5]) {
				rotate(a = [0, 45.00000000000001, 0.0]) {
					cube(size = [0.125, 0.125, 1.4142135623730951]);
				}
			}
			/*Edge 38 from bank.devices[0].thingy.vcell_in to $_38*/
			translate(v = [4.5, 24.5, -20.5]) {
				rotate(a = [0, 54.735610317245346, 45.0]) {
					cube(size = [0.125, 0.125, 1.7320508075688772]);
				}
			}
			/*Edge 38 from $_38 to bank.devices[0].thingy.vpush*/
			translate(v = [5.5, 23.5, -19.5]) {
				rotate(a = [0, 125.26438968275465, 135.0]) {
					cube(size = [0.125, 0.125, 1.7320508075688772]);
				}
			}
			/*Edge 13 from bank.devices[0].thingy.vlysis_in to $_13*/
			translate(v = [4.5, 23.5, -24.5]) {
				rotate(a = [0, 54.735610317245346, 45.0]) {
					cube(size = [0.125, 0.125, 1.7320508075688772]);
				}
			}
			/*Edge 26 from bank.devices[0].thingy.vlysis_in to $_26*/
			translate(v = [4.5, 24.5, -24.5]) {
				rotate(a = [0, 45.00000000000001, 0.0]) {
					cube(size = [0.125, 0.125, 1.4142135623730951]);
				}
			}
			/*Edge 41 from bank.devices[0].thingy.vlysis_in to $_41*/
			translate(v = [4.5, 25.5, -22.5]) {
				rotate(a = [0, 125.26438968275465, -45.0]) {
					cube(size = [0.125, 0.125, 1.7320508075688772]);
				}
			}
			/*Edge 15 from bank.devices[0].thingy.vpush to $_15*/
			translate(v = [4.5, 22.5, -20.5]) {
				rotate(a = [0, 54.735610317245346, 45.0]) {
					cube(size = [0.125, 0.125, 1.7320508075688772]);
				}
			}
			/*Edge 28 from bank.devices[0].thingy.vpush to $_28*/
			translate(v = [4.5, 24.5, -18.5]) {
				rotate(a = [0, 125.26438968275465, -45.0]) {
					cube(size = [0.125, 0.125, 1.7320508075688772]);
				}
			}
		}
	}
	/*Shell 5*/
	union() {
		%/*Nodes shell 5*/
		union() {
			/*Node bank.devices[0].thingy.vbead_in*/
			color(alpha = 0.1, c = "black") {
				translate(v = [5, 24, -20]) {
					cube(size = [1, 1, 1]);
				}
			}
			/*Node bank.devices[0].thingy.vcell_in*/
			color(alpha = 0.1, c = "black") {
				translate(v = [5, 25, -20]) {
					cube(size = [1, 1, 1]);
				}
			}
			/*Node bank.devices[0].thingy.vlysis_in*/
			color(alpha = 0.1, c = "black") {
				translate(v = [5, 24, -24]) {
					cube(size = [1, 1, 1]);
				}
			}
			/*Node bank.devices[0].thingy.vpush*/
			color(alpha = 0.1, c = "black") {
				translate(v = [5, 23, -20]) {
					cube(size = [1, 1, 1]);
				}
			}
		}
		/*Edges shell 5*/
		union() {
			/*Edge 2 from bank.devices[0].thingy.vbead_in to $_2*/
			translate(v = [6.5, 23.5, -18.5]) {
				rotate(a = [0, 125.26438968275465, 135.0]) {
					cube(size = [0.125, 0.125, 1.7320508075688772]);
				}
			}
			/*Edge 4 from bank.devices[0].thingy.vcell_in to $_4*/
			translate(v = [6.5, 25.5, -18.5]) {
				rotate(a = [0, 135.0, 180.0]) {
					cube(size = [0.125, 0.125, 1.4142135623730951]);
				}
			}
			/*Edge 7 from bank.devices[0].thingy.vlysis_in to $_7*/
			translate(v = [6.5, 23.5, -22.5]) {
				rotate(a = [0, 125.26438968275465, 135.0]) {
					cube(size = [0.125, 0.125, 1.7320508075688772]);
				}
			}
			/*Edge 9 from bank.devices[0].thingy.vpush to $_9*/
			translate(v = [6.5, 24.5, -18.5]) {
				rotate(a = [0, 125.26438968275465, -135.0]) {
					cube(size = [0.125, 0.125, 1.7320508075688772]);
				}
			}
		}
	}
	/*Shell 6*/
	union() {
		%/*Nodes shell 6*/
		union() {
			/*Node $_2*/
			color(alpha = 0.1, c = "pink") {
				translate(v = [6, 23, -19]) {
					cube(size = [1, 1, 1]);
				}
			}
			/*Node $_4*/
			color(alpha = 0.1, c = "pink") {
				translate(v = [6, 25, -19]) {
					cube(size = [1, 1, 1]);
				}
			}
			/*Node $_7*/
			color(alpha = 0.1, c = "pink") {
				translate(v = [6, 23, -23]) {
					cube(size = [1, 1, 1]);
				}
			}
			/*Node $_9*/
			color(alpha = 0.1, c = "pink") {
				translate(v = [6, 24, -19]) {
					cube(size = [1, 1, 1]);
				}
			}
		}
		/*Edges shell 6*/
		union();
	}
}
